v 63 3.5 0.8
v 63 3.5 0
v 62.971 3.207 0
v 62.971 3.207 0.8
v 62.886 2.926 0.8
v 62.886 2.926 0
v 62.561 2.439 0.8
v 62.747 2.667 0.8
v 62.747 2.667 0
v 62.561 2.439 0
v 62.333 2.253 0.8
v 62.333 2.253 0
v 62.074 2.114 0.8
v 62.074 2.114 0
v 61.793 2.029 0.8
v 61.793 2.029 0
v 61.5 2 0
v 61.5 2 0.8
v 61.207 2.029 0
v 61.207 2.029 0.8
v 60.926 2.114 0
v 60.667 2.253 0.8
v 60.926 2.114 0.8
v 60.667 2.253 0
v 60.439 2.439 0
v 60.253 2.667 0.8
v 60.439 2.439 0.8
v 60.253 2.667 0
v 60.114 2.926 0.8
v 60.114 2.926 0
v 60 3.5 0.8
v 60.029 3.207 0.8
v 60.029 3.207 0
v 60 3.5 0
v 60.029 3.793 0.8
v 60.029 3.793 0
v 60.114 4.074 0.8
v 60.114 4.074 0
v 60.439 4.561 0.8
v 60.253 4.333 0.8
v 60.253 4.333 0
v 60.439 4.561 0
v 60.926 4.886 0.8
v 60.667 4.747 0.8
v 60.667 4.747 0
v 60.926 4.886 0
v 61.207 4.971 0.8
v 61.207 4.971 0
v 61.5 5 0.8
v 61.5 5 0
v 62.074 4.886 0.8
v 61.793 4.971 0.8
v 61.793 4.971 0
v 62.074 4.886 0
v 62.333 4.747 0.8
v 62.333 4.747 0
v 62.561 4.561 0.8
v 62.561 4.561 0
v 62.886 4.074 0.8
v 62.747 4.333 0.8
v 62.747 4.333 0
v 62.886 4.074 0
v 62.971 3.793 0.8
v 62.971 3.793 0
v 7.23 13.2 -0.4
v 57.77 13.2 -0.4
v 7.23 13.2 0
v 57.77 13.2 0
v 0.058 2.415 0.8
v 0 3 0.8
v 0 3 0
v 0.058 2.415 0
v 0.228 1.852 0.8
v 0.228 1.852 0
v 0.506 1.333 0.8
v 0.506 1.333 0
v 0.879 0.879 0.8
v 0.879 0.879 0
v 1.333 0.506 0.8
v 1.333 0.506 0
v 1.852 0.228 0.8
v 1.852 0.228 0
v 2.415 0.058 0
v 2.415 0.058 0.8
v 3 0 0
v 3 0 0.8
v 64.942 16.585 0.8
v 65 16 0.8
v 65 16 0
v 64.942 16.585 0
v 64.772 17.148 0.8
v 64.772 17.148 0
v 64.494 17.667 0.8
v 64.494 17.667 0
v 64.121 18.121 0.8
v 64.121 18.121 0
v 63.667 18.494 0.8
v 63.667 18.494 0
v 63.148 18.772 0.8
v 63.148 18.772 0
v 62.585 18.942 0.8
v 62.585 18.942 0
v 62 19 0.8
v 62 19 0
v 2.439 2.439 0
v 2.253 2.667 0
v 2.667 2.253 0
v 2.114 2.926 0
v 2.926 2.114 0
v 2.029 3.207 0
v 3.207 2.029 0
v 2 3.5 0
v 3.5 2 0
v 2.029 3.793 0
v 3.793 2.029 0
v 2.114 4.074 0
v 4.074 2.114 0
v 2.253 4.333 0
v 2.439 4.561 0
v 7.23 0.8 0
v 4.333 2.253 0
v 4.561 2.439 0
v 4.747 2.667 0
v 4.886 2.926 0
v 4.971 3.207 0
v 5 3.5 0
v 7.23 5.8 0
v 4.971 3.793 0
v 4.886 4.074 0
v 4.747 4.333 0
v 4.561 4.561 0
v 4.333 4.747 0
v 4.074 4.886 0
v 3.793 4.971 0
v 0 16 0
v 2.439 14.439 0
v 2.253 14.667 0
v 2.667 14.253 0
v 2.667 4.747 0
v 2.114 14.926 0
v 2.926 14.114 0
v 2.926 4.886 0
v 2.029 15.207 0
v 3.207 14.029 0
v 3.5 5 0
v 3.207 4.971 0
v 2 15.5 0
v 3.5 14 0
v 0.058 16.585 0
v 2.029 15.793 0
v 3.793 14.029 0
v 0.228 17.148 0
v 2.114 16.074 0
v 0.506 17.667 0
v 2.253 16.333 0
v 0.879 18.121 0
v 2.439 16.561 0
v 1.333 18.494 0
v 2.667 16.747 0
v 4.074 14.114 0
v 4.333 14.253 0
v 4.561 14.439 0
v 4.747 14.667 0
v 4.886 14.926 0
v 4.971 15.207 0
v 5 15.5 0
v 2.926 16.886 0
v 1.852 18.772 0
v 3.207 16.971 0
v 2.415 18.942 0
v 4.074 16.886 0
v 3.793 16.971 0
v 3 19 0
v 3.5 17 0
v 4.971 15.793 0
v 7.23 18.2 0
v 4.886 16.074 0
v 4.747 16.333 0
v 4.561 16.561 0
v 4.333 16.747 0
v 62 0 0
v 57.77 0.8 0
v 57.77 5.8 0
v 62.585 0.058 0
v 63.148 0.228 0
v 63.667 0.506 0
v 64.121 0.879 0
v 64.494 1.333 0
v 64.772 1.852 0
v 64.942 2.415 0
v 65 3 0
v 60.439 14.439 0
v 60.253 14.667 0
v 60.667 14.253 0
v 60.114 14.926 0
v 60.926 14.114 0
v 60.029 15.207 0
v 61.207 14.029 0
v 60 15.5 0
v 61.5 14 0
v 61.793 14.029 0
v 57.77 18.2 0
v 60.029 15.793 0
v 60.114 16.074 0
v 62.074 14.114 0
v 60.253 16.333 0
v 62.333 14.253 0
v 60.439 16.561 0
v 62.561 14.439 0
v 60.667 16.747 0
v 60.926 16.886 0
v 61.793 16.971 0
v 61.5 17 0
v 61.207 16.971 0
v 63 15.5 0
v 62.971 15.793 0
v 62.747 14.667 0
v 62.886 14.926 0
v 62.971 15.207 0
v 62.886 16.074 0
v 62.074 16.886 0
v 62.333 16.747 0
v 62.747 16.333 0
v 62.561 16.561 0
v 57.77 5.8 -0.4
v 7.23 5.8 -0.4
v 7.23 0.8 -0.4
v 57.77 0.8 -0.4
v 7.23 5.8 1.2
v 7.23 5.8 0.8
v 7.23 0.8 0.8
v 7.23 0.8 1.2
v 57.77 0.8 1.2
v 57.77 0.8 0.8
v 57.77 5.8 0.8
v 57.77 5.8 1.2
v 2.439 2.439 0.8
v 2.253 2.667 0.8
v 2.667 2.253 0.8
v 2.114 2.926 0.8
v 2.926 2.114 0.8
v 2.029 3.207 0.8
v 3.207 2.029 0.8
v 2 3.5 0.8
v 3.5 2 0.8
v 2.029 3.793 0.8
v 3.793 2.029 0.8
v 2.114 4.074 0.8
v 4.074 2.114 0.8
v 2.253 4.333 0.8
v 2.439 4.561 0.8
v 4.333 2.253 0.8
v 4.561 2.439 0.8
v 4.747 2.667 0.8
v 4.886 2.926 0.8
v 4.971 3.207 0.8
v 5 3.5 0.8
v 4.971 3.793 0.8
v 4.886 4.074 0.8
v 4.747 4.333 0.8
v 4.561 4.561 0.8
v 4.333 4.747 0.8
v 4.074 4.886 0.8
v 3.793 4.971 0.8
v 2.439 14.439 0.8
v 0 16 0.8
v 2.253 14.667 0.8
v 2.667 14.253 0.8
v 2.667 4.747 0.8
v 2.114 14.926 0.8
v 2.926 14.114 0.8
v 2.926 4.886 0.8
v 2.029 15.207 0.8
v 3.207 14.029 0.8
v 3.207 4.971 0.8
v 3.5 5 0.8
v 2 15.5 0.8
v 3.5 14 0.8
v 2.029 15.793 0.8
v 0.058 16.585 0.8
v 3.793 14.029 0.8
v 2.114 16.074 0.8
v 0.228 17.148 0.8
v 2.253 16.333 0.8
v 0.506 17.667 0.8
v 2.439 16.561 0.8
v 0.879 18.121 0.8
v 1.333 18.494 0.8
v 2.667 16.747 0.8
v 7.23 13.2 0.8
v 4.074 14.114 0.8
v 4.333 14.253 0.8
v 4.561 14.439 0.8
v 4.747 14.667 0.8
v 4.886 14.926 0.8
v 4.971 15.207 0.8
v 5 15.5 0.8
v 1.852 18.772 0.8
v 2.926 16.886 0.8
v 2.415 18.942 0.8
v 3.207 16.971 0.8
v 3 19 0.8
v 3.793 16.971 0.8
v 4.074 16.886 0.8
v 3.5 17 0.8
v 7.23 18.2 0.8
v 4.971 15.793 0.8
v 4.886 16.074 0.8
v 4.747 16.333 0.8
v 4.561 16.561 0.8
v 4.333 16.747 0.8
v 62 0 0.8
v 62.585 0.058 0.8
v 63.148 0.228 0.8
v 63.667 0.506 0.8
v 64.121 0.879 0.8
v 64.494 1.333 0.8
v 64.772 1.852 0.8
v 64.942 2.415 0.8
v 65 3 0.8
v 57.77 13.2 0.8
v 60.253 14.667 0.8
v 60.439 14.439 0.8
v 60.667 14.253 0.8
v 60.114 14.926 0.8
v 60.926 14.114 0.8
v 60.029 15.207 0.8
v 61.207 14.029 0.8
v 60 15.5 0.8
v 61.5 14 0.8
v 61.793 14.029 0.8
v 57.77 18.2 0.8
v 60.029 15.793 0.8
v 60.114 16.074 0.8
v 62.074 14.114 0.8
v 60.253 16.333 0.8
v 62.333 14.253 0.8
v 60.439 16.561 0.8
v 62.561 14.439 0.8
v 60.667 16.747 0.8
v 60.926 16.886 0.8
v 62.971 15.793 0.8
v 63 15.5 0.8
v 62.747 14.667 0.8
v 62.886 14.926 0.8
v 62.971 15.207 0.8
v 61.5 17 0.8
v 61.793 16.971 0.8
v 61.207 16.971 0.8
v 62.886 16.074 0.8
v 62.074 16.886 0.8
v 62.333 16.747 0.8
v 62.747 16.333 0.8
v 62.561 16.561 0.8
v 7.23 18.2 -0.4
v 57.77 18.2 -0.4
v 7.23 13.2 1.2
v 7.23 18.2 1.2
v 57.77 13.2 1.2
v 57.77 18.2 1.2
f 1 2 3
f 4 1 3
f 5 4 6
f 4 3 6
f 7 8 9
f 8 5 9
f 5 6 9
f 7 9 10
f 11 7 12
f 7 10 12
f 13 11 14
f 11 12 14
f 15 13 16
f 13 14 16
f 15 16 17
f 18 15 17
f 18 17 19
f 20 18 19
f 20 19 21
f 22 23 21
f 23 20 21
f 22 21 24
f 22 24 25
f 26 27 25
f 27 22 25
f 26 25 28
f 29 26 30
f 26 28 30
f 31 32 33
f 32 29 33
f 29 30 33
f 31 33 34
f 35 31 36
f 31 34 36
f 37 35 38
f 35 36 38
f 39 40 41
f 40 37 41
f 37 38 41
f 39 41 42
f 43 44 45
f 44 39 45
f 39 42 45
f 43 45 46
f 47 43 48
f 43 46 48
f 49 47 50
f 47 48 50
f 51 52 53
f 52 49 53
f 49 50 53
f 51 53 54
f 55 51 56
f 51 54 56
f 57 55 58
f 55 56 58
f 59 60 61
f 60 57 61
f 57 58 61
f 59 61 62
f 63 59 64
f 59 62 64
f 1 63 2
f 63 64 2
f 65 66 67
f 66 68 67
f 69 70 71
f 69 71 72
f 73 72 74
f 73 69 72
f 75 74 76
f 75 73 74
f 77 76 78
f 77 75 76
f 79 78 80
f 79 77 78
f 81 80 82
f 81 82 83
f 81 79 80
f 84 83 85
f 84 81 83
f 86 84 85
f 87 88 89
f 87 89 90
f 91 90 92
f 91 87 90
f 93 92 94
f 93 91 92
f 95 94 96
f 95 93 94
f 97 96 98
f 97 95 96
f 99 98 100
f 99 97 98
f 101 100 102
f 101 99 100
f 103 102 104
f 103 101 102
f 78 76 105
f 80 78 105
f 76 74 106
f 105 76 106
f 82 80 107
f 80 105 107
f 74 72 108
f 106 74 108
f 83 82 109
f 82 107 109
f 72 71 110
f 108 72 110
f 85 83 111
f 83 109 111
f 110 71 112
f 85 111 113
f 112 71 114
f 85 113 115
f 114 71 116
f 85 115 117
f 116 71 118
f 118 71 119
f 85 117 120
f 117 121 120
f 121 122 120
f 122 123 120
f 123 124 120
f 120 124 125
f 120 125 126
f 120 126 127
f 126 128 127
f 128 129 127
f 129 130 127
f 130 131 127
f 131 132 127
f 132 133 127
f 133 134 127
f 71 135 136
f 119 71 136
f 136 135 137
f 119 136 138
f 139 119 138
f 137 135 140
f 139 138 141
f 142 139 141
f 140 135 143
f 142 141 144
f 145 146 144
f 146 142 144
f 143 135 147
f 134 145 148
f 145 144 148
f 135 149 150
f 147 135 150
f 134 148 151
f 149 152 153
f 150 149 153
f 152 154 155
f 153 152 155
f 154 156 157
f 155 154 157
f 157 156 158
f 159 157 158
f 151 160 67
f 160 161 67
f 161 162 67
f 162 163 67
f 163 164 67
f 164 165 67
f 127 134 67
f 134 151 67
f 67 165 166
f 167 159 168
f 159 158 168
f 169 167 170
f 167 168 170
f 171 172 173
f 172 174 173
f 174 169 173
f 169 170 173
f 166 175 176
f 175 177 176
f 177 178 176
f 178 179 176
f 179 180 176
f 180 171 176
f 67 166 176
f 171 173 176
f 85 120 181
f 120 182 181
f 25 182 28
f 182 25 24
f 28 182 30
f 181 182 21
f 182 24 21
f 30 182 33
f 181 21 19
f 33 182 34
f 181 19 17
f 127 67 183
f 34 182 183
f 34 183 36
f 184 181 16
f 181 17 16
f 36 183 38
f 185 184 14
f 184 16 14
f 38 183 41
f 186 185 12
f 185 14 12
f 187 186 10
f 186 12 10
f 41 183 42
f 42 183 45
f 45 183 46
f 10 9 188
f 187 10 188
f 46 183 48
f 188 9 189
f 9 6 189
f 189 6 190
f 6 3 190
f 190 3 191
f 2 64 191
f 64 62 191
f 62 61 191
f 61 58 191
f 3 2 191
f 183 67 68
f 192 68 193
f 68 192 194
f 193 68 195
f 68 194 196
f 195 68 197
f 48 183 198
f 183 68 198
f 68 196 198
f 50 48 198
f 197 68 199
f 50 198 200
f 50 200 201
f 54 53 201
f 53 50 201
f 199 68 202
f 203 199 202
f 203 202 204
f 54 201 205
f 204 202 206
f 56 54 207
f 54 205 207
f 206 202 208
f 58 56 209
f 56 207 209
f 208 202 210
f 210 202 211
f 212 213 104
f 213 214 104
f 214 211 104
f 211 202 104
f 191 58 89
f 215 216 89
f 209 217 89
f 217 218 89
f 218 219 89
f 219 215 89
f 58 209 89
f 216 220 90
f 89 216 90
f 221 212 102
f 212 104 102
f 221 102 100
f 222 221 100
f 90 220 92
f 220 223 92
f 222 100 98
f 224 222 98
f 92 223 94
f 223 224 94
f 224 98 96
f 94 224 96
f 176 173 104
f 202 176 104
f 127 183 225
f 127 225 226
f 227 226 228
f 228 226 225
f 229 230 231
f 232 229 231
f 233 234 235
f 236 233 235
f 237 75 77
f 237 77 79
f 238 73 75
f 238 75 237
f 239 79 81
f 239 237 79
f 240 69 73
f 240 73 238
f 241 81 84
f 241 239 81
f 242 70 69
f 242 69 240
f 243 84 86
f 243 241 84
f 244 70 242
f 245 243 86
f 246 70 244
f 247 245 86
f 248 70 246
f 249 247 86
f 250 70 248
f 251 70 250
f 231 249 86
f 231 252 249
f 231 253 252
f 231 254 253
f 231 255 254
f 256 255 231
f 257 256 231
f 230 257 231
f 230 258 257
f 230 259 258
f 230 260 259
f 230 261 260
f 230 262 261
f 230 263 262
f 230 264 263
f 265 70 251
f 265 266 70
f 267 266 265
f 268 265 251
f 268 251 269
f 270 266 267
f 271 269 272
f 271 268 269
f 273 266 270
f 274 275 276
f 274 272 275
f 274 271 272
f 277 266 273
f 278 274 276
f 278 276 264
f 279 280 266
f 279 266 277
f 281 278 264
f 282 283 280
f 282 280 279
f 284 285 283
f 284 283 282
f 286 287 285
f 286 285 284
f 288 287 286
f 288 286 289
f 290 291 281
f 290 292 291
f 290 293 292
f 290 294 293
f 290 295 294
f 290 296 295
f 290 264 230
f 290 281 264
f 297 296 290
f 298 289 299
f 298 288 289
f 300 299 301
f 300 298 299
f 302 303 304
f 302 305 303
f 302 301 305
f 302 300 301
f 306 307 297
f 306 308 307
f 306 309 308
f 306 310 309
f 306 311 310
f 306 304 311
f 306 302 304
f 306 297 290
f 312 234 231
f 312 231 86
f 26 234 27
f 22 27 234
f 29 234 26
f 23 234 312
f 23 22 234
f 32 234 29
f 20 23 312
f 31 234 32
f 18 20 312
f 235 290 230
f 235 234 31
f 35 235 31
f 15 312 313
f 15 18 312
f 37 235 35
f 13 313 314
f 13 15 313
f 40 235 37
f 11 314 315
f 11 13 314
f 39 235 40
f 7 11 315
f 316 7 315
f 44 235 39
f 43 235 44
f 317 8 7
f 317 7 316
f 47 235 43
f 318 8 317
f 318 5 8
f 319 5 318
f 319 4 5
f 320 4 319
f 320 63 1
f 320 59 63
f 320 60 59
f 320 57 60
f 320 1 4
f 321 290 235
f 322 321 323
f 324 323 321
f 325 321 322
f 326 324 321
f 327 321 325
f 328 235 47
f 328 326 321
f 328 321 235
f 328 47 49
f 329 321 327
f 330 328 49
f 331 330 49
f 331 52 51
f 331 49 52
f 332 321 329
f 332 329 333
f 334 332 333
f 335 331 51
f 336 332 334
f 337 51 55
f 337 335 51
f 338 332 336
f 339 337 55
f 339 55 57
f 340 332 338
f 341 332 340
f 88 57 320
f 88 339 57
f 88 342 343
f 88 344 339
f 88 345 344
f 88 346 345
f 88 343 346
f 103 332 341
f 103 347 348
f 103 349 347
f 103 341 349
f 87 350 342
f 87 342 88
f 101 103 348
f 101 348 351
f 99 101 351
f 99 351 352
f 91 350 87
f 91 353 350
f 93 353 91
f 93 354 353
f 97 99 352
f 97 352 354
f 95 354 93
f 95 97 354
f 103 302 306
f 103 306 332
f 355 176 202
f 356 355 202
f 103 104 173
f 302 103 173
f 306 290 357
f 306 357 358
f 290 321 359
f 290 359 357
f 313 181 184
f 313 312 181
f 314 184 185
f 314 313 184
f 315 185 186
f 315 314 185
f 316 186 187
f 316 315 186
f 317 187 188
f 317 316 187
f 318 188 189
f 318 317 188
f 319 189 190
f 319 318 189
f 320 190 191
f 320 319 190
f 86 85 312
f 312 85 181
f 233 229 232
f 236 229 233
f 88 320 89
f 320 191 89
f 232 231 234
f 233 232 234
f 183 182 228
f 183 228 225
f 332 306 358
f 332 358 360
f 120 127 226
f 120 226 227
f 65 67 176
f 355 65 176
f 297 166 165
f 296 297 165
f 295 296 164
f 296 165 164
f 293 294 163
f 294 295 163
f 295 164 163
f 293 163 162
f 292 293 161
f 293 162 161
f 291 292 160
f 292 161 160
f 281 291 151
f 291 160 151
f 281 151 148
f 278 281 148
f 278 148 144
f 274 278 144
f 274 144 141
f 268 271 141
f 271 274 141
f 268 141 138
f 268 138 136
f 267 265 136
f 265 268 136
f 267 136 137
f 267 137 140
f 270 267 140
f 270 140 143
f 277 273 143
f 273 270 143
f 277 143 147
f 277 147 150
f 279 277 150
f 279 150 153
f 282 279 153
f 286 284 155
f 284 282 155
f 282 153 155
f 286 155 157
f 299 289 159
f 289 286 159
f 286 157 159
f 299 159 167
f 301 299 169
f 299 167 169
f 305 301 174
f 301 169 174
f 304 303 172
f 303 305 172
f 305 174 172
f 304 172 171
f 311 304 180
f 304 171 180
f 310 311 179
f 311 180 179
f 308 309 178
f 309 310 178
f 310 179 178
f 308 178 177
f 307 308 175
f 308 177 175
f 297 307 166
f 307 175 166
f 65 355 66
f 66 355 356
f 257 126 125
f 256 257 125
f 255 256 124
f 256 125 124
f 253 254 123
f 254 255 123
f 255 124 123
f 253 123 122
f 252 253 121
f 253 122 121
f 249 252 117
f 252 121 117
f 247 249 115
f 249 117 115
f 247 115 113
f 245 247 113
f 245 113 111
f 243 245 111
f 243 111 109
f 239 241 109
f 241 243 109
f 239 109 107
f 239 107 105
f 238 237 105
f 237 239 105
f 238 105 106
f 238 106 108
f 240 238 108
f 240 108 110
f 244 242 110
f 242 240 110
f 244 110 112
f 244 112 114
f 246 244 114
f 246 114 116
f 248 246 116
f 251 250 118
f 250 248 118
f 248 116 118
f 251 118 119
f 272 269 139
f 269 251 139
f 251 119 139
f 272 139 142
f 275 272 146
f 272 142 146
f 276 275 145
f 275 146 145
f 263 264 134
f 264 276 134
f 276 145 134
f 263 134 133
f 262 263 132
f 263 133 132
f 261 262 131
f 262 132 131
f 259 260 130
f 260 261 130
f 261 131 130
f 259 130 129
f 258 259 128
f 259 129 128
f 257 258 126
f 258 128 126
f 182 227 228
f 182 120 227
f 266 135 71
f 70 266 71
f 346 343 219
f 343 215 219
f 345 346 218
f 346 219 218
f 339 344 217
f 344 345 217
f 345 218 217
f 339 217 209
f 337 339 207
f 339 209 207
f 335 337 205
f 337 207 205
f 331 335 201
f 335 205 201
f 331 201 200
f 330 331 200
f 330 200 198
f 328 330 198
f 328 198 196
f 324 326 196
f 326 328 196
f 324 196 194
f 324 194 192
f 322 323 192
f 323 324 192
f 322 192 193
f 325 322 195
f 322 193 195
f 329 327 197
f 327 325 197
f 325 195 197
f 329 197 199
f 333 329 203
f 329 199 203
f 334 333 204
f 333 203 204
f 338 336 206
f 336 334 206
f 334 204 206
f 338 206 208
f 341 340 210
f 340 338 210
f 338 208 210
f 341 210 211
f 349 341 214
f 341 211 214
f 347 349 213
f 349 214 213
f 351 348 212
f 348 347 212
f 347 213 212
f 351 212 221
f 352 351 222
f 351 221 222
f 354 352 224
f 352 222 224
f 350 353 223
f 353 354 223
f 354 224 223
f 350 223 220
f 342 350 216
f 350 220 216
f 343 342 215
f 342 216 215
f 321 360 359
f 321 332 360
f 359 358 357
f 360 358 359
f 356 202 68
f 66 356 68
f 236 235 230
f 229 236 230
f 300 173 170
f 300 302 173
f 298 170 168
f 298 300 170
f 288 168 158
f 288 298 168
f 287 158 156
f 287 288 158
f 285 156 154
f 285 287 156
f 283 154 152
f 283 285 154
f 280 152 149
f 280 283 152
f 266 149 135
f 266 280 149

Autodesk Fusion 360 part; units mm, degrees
sketch "Sketch1" plane through (0, 0, 0) normal (0, 0, 1) x (1, 0, 0)
  line L0 (0, 0) -> (65, 0)
  line L1 (65, 0) -> (65, 19)
  line L2 (65, 19) -> (0, 19)
  line L3 (0, 19) -> (0, 0)
  circle A0 centre (3.5, 15.5) radius 1.5
  line L4 (32.5, 19) -> (32.5, 0) construction
  line L5 (65, 9.5) -> (0, 9.5) construction
  circle A1 centre (61.5, 15.5) radius 1.5
  circle A2 centre (3.5, 3.5) radius 1.5
  circle A3 centre (61.5, 3.5) radius 1.5
  line L6 (57.77, 13.2) -> (7.23, 13.2)
  line L7 (7.23, 13.2) -> (7.23, 18.2)
  line L8 (7.23, 18.2) -> (57.77, 18.2)
  line L9 (57.77, 18.2) -> (57.77, 13.2)
  line L10 (57.77, 13.2) -> (7.23, 18.2) construction
  line L11 (7.23, 13.2) -> (57.77, 18.2) construction
  line L12 (7.23, 0.8) -> (57.77, 0.8)
  line L13 (57.77, 0.8) -> (57.77, 5.8)
  line L14 (57.77, 5.8) -> (7.23, 5.8)
  line L15 (7.23, 5.8) -> (7.23, 0.8)
  line L16 (57.77, 3.3) -> (7.23, 3.3) construction
  point P0 (32.5, 15.7)
  dimension "d1" = 65
  dimension "d2" = 19
  dimension "d3" = 3
  dimension "d4" = 3.5
  dimension "d5" = 3.5
  dimension "d6" = 50.54
  dimension "d7" = 5
  dimension "d8" = 0.8
extrude "Extrude1" add sketch "Sketch1" along normal blind 0.8 contours L0 L1 L2 L3 | L6 L7 L8 L9 | L12 L13 L14 L15
fillet "Fillet1" radius 3 4 edges at (65, 19, 0.4) (0, 0, 0.4) (65, 0, 0.4) (0, 19, 0.4)
extrude "Extrude2" add sketch "Sketch1" along normal blind 0.4 from surface at 0.8 contours L6 L7 L8 L9 | L12 L13 L14 L15
extrude "Extrude3" add sketch "Sketch1" against normal blind 0.4 contours L6 L7 L8 L9 | L12 L13 L14 L15
